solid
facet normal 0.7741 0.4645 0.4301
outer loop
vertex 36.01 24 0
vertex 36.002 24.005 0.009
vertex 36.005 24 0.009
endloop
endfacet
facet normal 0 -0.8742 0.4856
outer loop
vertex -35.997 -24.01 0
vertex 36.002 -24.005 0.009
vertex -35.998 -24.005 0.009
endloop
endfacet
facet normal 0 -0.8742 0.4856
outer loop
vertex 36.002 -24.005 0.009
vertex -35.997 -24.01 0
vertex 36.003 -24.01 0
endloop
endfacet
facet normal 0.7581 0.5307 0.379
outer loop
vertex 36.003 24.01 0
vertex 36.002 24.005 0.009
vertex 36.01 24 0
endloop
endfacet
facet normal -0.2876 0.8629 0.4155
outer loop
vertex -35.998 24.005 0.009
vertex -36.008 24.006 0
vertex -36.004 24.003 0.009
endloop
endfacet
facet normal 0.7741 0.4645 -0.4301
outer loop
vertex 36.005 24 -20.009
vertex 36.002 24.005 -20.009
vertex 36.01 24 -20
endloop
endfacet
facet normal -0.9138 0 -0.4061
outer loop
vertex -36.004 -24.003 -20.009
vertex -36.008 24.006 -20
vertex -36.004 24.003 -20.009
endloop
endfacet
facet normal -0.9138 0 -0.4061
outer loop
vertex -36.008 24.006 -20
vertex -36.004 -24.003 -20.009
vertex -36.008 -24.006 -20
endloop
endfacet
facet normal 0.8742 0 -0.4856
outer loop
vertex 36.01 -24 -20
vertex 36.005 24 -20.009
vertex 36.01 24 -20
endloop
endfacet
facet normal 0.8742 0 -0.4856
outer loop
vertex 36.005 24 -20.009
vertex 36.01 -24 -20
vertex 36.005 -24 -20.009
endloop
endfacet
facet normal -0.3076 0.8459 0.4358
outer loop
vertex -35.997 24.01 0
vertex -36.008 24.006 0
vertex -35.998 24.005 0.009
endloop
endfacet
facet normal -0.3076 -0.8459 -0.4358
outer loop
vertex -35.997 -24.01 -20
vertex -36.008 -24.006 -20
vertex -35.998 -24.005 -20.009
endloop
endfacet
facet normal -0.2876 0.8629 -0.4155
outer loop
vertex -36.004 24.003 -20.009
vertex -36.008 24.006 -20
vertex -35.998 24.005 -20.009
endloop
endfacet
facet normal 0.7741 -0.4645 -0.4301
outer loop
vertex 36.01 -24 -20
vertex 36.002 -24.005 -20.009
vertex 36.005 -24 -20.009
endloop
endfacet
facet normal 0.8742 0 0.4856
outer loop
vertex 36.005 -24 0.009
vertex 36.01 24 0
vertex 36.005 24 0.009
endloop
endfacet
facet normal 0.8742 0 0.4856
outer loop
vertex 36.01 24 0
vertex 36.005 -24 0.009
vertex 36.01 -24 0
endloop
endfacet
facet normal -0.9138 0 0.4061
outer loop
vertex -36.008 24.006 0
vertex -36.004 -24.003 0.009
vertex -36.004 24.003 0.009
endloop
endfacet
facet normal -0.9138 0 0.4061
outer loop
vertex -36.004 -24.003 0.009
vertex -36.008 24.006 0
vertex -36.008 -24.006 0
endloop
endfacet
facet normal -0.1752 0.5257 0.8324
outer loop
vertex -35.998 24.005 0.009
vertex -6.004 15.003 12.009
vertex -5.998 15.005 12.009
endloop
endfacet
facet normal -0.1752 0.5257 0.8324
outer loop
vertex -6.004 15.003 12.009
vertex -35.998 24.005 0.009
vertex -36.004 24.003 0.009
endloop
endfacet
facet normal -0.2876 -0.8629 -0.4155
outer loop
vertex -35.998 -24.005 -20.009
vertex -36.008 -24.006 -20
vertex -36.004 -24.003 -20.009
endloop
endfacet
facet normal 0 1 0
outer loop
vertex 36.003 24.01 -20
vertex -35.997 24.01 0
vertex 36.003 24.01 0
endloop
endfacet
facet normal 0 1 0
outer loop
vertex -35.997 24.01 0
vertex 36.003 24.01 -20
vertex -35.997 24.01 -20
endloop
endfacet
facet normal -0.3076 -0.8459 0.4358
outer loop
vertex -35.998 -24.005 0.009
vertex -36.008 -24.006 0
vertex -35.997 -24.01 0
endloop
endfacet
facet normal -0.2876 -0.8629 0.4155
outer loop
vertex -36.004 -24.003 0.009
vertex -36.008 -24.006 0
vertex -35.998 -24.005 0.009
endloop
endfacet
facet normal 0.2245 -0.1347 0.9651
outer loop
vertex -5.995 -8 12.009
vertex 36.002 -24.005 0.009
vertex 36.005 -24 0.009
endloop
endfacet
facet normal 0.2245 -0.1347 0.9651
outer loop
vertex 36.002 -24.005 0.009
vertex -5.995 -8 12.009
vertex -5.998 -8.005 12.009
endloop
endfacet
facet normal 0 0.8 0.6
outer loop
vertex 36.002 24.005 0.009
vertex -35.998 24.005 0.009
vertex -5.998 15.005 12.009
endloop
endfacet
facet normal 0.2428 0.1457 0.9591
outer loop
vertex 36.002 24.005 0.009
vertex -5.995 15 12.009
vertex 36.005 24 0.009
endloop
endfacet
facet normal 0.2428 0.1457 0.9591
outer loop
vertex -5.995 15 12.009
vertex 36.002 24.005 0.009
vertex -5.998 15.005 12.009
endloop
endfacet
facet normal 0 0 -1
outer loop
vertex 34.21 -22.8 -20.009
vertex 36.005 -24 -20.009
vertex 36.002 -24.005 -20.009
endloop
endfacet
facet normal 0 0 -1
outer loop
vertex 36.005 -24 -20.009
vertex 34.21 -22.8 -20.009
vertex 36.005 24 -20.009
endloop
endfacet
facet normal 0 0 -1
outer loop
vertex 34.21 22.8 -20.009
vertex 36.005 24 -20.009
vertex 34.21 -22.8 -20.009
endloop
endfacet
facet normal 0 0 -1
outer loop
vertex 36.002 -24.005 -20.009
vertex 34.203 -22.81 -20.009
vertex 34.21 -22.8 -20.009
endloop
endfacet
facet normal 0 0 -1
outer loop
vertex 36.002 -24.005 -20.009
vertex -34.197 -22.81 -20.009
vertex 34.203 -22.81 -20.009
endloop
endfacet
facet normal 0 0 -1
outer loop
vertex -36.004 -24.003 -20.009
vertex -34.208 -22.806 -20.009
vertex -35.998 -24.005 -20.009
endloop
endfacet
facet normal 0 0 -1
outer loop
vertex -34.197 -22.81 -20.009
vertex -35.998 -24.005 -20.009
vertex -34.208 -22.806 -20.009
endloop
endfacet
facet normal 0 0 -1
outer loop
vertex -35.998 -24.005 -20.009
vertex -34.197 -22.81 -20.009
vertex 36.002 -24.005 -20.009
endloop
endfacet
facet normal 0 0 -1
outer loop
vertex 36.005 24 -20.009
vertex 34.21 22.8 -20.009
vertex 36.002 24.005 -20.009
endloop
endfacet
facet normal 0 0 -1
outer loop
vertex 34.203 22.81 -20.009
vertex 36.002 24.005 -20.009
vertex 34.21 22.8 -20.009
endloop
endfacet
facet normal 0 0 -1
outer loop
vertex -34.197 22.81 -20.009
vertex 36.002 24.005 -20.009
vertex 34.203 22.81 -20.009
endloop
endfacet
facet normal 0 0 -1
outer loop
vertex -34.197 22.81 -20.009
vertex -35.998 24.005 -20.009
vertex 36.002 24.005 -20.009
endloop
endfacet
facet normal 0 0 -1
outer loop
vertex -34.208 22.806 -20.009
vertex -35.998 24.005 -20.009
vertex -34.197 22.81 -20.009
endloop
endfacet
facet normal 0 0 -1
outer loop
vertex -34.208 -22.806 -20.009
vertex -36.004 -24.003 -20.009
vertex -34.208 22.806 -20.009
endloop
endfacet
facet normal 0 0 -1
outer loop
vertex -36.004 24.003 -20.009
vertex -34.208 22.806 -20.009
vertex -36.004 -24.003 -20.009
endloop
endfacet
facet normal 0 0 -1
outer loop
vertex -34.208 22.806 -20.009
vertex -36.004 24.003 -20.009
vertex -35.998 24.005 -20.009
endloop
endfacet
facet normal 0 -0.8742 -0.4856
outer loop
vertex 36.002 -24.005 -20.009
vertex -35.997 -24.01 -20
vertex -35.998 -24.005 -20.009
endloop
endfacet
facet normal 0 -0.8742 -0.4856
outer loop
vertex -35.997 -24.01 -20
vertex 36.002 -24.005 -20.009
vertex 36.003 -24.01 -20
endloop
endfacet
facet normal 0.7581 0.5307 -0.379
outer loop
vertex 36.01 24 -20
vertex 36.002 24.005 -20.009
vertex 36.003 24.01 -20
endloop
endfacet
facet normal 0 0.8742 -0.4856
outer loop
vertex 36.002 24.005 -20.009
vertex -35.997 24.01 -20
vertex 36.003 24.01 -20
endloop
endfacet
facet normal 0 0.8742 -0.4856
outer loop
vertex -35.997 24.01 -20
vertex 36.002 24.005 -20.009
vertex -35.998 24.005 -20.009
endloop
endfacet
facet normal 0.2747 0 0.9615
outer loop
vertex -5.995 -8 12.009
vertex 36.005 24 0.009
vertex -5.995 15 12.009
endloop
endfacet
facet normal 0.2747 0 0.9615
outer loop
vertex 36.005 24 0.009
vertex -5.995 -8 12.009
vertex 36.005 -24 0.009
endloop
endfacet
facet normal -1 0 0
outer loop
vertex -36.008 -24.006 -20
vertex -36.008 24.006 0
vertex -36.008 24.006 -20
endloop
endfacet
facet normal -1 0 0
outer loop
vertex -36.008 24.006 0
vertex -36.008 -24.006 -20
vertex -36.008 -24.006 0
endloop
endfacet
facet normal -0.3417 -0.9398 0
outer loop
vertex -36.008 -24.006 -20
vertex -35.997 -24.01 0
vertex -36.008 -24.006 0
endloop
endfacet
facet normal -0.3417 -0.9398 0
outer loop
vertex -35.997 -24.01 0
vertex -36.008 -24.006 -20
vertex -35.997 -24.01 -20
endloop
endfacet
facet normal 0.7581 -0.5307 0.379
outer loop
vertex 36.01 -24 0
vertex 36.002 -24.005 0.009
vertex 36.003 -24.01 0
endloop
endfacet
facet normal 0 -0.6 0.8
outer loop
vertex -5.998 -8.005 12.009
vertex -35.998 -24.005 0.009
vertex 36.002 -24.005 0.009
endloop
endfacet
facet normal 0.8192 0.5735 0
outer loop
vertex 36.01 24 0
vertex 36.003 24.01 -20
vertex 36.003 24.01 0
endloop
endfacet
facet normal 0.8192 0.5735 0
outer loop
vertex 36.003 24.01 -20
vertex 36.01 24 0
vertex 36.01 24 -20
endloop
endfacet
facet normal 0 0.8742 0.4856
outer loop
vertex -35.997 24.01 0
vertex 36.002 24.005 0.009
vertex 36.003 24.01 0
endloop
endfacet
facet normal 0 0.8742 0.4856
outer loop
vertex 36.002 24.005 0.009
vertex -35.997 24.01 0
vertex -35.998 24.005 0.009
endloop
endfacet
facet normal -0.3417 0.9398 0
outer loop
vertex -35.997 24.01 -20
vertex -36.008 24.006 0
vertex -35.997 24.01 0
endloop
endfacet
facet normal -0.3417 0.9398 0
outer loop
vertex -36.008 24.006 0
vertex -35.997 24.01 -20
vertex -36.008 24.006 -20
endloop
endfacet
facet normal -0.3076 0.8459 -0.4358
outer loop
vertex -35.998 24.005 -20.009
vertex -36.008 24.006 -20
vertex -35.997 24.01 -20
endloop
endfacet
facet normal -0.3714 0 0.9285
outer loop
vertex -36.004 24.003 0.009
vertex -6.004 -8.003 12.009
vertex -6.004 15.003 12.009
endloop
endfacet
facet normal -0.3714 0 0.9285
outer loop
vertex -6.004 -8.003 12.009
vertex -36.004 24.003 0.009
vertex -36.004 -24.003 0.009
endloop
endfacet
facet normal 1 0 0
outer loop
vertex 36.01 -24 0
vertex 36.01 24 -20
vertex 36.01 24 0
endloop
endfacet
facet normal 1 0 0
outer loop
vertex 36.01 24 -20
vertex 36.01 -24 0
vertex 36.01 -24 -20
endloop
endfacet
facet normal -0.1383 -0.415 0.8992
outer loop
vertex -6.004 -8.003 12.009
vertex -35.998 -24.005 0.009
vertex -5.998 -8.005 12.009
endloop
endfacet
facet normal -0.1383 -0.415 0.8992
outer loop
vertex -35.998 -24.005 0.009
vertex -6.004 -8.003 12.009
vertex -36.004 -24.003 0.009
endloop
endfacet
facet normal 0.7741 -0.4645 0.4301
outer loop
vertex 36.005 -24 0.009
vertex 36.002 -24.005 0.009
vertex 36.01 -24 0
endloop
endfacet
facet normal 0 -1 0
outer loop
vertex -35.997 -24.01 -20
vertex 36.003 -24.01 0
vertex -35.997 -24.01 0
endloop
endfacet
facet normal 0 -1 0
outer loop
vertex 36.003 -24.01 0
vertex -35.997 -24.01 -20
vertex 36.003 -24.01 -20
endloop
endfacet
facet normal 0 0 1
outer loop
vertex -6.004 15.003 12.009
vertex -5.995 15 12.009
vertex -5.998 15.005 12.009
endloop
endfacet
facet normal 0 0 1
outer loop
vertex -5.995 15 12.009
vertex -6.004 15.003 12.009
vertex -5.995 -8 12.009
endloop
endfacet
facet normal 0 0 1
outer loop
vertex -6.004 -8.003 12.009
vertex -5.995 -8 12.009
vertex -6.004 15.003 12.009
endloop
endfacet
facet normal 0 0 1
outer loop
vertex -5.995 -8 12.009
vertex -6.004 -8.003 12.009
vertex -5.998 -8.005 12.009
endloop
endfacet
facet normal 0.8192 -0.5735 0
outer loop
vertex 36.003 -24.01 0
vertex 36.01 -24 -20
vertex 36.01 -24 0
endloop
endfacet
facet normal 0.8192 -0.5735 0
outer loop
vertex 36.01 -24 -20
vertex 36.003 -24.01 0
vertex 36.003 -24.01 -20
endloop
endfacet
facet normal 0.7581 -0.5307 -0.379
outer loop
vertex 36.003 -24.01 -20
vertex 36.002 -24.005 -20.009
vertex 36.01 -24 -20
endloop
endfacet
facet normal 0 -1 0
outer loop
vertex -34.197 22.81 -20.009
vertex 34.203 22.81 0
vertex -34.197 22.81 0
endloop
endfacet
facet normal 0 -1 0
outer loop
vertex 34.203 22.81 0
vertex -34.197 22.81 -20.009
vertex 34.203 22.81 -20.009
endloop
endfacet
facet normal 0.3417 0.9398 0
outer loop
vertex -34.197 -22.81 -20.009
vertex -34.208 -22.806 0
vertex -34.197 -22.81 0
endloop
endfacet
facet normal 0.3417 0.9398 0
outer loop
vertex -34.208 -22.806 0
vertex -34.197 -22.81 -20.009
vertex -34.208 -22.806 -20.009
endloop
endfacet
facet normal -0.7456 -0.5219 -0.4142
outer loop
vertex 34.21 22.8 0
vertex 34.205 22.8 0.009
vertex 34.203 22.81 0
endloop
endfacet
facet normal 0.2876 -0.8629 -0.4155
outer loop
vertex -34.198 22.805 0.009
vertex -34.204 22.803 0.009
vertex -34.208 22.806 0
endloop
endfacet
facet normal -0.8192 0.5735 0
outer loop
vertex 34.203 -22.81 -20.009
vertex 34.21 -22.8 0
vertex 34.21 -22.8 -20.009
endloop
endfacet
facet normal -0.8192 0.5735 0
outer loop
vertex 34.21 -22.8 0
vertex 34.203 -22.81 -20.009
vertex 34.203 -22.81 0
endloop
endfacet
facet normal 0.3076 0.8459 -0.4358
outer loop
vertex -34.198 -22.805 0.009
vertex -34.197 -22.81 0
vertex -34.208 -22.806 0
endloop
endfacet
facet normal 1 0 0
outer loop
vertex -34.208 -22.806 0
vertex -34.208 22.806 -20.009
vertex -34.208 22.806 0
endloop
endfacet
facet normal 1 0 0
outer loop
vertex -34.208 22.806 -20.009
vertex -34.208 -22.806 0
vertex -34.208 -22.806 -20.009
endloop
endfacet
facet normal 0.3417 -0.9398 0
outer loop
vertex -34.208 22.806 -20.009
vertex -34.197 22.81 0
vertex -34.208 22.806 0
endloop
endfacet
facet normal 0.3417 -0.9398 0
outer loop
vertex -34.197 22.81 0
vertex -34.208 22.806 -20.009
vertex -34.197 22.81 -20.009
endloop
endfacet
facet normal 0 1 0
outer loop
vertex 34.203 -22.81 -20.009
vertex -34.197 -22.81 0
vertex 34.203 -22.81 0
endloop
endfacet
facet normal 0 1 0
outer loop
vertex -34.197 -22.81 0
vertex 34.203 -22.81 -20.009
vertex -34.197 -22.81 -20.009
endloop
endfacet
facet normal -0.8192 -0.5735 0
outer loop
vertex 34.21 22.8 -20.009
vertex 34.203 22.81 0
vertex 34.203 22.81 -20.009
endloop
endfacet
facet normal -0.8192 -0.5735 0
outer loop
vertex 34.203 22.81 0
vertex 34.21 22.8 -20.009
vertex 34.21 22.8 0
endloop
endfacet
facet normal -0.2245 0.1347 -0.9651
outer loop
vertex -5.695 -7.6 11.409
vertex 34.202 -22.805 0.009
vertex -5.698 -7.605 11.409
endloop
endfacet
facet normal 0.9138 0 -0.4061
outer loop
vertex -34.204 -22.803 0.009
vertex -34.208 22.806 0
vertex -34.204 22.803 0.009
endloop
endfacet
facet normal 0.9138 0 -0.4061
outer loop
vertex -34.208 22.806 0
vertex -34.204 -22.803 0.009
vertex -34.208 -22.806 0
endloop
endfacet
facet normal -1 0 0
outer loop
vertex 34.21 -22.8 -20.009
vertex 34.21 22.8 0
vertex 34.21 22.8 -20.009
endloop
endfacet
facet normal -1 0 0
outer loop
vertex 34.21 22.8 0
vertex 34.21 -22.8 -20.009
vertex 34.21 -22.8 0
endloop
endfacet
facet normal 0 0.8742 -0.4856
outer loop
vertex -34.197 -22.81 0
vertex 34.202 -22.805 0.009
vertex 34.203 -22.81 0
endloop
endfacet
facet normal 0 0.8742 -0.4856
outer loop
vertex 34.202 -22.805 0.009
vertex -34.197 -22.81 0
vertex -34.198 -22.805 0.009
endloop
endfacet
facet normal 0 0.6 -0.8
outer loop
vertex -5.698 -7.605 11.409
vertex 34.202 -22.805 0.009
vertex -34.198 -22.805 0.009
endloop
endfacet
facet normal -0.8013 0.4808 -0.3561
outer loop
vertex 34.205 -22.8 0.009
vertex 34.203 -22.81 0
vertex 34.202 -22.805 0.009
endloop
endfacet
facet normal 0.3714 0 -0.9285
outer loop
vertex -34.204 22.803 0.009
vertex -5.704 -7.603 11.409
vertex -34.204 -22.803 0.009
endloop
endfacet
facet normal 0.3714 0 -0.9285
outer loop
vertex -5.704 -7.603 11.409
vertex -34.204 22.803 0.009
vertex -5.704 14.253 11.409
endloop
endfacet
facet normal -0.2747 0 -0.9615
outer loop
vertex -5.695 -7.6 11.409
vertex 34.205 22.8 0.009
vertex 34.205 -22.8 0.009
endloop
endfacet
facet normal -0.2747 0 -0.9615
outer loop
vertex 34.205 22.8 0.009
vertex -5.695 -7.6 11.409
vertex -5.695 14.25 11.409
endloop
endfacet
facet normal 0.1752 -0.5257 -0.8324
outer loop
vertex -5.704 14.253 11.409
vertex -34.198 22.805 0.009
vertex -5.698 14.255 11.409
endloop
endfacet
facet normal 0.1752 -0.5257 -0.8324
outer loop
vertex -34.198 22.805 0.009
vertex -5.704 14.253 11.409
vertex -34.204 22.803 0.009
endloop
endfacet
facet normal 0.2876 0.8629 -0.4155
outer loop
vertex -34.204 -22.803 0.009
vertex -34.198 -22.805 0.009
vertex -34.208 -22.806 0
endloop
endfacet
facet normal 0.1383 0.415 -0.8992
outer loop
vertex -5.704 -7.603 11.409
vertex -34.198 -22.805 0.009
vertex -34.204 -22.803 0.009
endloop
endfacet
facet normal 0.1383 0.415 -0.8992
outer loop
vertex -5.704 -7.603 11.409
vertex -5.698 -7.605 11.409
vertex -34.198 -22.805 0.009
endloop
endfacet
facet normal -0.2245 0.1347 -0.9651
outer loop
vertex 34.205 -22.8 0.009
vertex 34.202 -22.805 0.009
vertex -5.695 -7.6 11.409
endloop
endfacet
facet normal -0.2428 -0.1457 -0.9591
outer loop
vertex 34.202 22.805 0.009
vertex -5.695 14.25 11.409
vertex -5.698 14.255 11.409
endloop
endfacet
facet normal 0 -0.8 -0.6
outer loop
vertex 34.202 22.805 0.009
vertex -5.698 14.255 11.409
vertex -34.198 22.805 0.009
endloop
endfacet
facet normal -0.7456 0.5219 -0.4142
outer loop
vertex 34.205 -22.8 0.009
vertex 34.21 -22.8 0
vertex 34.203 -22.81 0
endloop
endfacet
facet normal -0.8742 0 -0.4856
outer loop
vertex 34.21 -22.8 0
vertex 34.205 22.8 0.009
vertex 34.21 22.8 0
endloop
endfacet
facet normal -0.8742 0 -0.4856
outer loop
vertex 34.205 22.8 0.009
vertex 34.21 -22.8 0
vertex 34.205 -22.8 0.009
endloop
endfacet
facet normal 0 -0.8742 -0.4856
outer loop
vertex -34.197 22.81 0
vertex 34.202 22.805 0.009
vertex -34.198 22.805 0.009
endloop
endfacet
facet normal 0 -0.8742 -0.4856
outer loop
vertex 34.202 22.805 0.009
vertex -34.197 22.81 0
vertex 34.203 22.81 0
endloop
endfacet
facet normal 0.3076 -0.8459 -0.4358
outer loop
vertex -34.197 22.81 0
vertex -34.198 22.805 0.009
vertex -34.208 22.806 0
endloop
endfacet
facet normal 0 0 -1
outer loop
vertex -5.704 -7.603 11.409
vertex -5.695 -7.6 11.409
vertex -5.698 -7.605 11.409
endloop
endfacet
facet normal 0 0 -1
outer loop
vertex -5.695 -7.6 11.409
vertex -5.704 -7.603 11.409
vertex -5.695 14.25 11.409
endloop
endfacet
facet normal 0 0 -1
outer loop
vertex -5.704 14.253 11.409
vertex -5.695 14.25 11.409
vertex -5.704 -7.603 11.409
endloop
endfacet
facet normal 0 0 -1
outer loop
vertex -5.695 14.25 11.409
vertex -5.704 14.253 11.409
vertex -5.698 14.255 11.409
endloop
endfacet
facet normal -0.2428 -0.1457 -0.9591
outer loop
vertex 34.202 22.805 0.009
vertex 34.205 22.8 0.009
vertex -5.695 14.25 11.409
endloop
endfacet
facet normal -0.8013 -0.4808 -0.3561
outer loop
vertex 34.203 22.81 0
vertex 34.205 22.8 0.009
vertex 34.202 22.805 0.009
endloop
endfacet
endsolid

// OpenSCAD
// --- User Inputs ---
width = 72; // Total width of the base rectangle
height = 48; // Total height of the base rectangle
depth = 20; // How far the shape extends downwards (z<0)

//width = 65; // Total width of the base rectangle
//height = 45; // Total height of the base rectangle
//depth = 20; // How far the shape extends downwards (z<0)


// The two points for the roof, based on a bottom-left origin
p1_orig = [30, 16, 12];
p2_orig = [30, 39, 12];

//p1_orig = [20, 24, 12];
//p2_orig = [20, 42, 12];

// --- Model Generation (No need to edit below) ---

// 1. NORMALIZE COORDINATES
// Calculate the offset to move the center of the base to the origin [0,0,0]
offset = [width / 2, height / 2, 0];

// Define the 4 corners of the base at z=0, now centered
b1 = [-width / 2, -height / 2, 0]; // Bottom-left
b2 = [ width / 2, -height / 2, 0]; // Bottom-right
b3 = [ width / 2,  height / 2, 0]; // Top-right
b4 = [-width / 2,  height / 2, 0]; // Top-left

// Define the 4 corners of the bottom at z=-depth
d1 = [b1.x, b1.y, -depth];
d2 = [b2.x, b2.y, -depth];
d3 = [b3.x, b3.y, -depth];
d4 = [b4.x, b4.y, -depth];

// Normalize the user-provided roof points
p1 = p1_orig - offset;
p2 = p2_orig - offset;

// 2. CREATE THE HULLS
// The final object is the difference between the two hulls
difference() {
    // A. Outer Hull
    hull() {
        // Use tiny spheres to mark the vertices for the hull
        for (pt = [b1, b2, b3, b4, d1, d2, d3, d4, p1, p2]) {
            translate(pt) sphere(r = 0.01);
        }
    }

    // B. Inner Hull
    hull() {
        // Scale down the top and roof points by 5%
        scale_factor = 0.95;
        for (pt = [b1, b2, b3, b4, p1, p2]) {
            translate(pt * scale_factor) sphere(r = 0.01);
        }

        // Extend the bottom points downwards to ensure the cut creates an opening
        for (pt = [d1, d2, d3, d4]) {
            translate(pt * scale_factor - [0, 0, 100]) sphere(r = 0.01);
        }
    }
}
